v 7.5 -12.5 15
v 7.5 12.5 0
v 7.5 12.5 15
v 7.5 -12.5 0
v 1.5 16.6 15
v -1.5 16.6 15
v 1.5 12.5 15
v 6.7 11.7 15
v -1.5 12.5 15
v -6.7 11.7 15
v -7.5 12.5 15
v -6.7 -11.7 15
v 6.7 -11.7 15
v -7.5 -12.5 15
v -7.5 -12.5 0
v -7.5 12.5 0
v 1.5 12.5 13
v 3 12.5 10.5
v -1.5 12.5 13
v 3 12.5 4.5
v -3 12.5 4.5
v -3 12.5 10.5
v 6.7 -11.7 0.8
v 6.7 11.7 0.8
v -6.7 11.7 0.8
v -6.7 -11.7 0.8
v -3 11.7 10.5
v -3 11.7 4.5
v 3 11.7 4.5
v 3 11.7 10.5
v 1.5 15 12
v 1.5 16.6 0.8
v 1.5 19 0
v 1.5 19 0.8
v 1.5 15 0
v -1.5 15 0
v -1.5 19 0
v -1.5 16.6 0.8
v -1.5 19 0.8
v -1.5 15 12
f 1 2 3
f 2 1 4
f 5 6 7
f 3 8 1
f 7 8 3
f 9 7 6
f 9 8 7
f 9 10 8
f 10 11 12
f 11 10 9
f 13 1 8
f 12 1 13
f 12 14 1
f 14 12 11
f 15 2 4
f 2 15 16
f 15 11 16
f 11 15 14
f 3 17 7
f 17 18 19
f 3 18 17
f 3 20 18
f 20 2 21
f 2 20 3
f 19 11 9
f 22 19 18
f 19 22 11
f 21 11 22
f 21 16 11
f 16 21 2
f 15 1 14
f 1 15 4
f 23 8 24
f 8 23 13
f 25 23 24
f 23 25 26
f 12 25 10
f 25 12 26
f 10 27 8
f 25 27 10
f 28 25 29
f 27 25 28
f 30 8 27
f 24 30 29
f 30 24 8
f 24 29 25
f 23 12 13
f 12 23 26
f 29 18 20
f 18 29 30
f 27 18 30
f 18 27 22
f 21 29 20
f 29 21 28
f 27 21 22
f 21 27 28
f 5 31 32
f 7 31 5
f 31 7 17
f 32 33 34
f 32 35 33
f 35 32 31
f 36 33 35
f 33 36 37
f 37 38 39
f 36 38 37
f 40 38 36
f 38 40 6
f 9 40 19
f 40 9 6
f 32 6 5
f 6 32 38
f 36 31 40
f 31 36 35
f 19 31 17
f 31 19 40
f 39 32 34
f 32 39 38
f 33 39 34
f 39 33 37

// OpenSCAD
/* Konstanten für Kastenformat */
OPEN_NONE = 0; // Box mit fünf Seiten
OPEN_LEFT = -1; // Box mit vier Seite, vorne und links offen
OPEN_RIGHT = 1; // Box mit vier Seite, vorne und rechts offen

/* Position für das LED Loch */
LED_TOP = 0; // "oben"
LED_BACK = 1; // Rückwand
LED_CLIP = 2; // keine
LED_CABLEIN = 3; // keine
LED_3MM = 4;
LED_NONE = 5; // keine

/* LED Größen */
LED_5050 = [6,6]; // Die Standard WS2812 LEDs
LED_3528 = [4.0,3.0];
LED_1206 = [3.5,2];
LED_DEFAULT = LED_5050;

/* Wandstärke */
wall = 0.8;
tunnel_height = 2;
clip_spacing = 2.5;
clip_thick = 1.6;
/*
 * width/height = Abmessungen des "Fensters" (Außenmass)
 * depth = Tiefe der Kiste
 * open = Kiste mit zwei offenen Seiten für Über-Eck Einbau
 * led = Position der LED
 * led_offset = Abweichung der LED Position von der Mitte
 *    Zahl > 1: Offset in Einheiten von der Mitte aus
 *    Zahl < 1: relative Position auf der Wand von links außen gemessen
*/
module lightbox( width = 20, height = 25, depth = 15, open = OPEN_NONE, led = LED_BACK, led_offset = 0.5, led_size = LED_DEFAULT ) {
    shrink = (open != OPEN_NONE ? wall : (2*wall));
    move = open * wall;
    led_move = (abs(led_offset) < 1 ? ((led_offset * width) - (0.5 * width)) : led_offset);    
    translate([0,0,depth/2])
    difference(){
        cube([width,height,depth],true);
        translate([move,0,wall]) cube([width-shrink,height-2*wall,depth],true);
        // Loch mit 1.2 wall Höhe um Rendering Fehler zu unterdrücken
        if (led == LED_TOP || led == LED_CLIP) {
            translate([led_move, height/2-(0.5*wall),0]) cube([led_size[0],1.2*wall,led_size[1]],true);
        } else if (led == LED_BACK) {
            translate([led_move ,0,-depth/2+(0.5*wall)]) cube([led_size[0],led_size[1],1.2*wall],true);
        } else if (led == LED_CABLEIN) {
            cutoff_width = ((len(led_size) == undef) ? led_size : 5);
            translate([led_move, height/2, -depth/2+wall+1]) cube([cutoff_width, 2*wall, 2],true);
        } else if (led == LED_3MM) {
            translate([led_move ,0,-depth/2+(0.5*wall)]) cylinder(d=3, h=2*wall, center=true, $fn=20);
        }        
    }
     if (led == LED_CLIP) {
        
        translate([led_move,height/2,depth/2]) color([1,0,0]) {            
            // clip (horizontaler balken über der LED)
            translate([0, clip_spacing + clip_thick/2 ,0]) cube([3, clip_thick, depth], true);
            // Verbindung clip / Gehäuse (Trapez)
            translate([1.5,clip_spacing,depth/2]) rotate([90,90,-90]) linear_extrude(3) polygon(points = [ [0,0],[3,0],[2,clip_spacing],[0,clip_spacing] ]);
            // Brim
            translate([0,5,-depth/2+wall/2]) cube([3, 3, wall], true);             
        }  
        
    }
    if (led == LED_3MM) {        
        translate([led_move ,0,wall])
        difference(){
            cylinder(d=5, h=2*wall,center=true, $fn=20);
            cylinder(d=3, h=2*wall, center=true, $fn=20);
        }
    }    
}

width = 15;
height = 25;
depth = 15;
open = OPEN_NONE;
led = LED_CLIP;
led_offset = 0.5;
led_size = LED_DEFAULT;
module clibox() {
    lightbox( width = width, height = height, depth = depth, open = open, led = led, led_offset =led_offset, led_size = led_size );
}

/*
translate([50,0,0])
difference(){
    lightbox( width = 39, height = 25, depth = 15, led = LED_CABLEIN, led_size = LED_3528);
    translate([0,2.5-wall,10])cube([45,20,10],true);
}

union(){
    difference(){
        lightbox( width = 39, height = 25, depth = 15, led = LED_CABLEIN, led_size = 12);
        translate([0,2.5-wall,10])cube([45,20,10],true);
    }
    translate([0,0,7.5])cube([wall,25,15],true);
}*/

//lightbox( width = 15, height = 20, depth = 12, led = LED_CLIP, led_offset=0.5, led_size = LED_5050);

clibox();
